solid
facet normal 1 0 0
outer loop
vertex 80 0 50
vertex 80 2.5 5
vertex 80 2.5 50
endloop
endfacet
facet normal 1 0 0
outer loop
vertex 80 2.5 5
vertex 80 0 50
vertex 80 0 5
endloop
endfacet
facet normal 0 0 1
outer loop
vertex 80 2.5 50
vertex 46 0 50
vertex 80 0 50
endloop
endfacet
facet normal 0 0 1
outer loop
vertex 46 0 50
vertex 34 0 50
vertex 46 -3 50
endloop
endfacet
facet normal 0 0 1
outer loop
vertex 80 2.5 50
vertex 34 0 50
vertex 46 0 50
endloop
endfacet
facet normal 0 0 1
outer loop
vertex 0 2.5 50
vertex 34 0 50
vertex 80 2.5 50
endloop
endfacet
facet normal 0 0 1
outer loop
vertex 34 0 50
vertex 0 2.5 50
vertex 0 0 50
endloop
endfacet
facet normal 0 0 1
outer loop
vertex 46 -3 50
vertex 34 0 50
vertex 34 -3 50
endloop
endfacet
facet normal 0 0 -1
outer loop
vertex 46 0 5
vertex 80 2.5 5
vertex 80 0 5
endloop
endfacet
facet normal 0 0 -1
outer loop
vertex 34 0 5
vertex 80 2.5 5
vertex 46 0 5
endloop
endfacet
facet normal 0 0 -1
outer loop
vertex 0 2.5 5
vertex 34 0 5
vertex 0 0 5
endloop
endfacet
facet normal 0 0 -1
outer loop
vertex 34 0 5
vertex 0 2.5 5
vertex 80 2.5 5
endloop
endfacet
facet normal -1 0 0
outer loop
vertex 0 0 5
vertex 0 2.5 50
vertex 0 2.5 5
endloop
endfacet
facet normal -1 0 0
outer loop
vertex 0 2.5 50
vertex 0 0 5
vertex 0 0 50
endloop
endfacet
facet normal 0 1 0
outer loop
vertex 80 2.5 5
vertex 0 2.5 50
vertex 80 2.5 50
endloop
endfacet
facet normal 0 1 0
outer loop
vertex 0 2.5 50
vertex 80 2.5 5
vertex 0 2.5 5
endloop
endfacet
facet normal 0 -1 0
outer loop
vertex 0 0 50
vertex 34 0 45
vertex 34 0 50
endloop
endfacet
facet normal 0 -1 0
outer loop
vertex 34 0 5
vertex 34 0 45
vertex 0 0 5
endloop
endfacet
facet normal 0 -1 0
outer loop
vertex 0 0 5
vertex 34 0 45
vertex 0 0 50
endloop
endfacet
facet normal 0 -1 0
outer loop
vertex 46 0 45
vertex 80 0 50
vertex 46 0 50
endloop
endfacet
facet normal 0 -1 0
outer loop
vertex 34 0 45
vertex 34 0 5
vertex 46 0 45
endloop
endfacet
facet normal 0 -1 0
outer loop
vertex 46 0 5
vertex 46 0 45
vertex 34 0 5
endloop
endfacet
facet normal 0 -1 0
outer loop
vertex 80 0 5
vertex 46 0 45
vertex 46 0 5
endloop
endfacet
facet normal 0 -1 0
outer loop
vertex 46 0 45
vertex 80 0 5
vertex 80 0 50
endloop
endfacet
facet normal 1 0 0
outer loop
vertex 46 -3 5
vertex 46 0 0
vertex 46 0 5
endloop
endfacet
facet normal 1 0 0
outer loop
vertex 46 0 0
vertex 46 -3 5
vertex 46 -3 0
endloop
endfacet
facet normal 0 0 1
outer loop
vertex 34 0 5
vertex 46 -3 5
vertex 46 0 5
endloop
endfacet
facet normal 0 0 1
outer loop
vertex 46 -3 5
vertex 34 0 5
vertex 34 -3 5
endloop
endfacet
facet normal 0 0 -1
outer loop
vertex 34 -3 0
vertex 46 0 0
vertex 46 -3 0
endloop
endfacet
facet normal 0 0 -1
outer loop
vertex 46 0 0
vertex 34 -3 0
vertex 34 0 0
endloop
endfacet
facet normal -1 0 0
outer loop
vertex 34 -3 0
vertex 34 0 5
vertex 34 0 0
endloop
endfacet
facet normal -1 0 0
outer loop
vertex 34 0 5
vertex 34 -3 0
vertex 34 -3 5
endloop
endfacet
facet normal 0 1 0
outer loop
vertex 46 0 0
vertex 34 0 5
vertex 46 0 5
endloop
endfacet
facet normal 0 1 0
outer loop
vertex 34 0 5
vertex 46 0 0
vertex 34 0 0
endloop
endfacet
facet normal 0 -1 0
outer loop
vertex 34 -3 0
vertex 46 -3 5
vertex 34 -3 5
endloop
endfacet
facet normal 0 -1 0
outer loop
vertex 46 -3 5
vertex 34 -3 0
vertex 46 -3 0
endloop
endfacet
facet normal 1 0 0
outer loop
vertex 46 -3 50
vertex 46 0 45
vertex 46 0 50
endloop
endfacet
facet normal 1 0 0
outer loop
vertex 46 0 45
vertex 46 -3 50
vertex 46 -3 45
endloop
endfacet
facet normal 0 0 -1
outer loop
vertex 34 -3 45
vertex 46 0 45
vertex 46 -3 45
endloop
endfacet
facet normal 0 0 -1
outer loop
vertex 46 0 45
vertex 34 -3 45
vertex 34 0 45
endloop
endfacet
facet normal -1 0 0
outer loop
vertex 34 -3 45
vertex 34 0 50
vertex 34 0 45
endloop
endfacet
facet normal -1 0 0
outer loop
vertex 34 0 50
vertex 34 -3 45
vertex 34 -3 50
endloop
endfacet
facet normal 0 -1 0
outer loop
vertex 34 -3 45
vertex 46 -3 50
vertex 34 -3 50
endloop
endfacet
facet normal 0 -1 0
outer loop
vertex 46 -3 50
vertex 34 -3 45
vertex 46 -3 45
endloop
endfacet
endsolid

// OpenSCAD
// =========================
// Projeto Caelum - Montagem modular com encaixes
// Versão revisada: paredes agora têm TABS SUPERIORES
// =========================

// -------------------- CONFIG --------------------
wall = 2.5;
clearance = 0.4;
snap_gap = 0.2;

// Dimensões do corpo
body_x = 80;
body_y = 100;
body_z = 50;

// Cabeça
head_x = 50;
head_y = 40;
head_z = 40;

// Encaixes
tab_w = 12;
tab_h = 5;
tab_d = 3;

// Pinos da cabeça
peg_d = 6;
peg_h = 8;

// modos
view_mode =2;
// -------------------- HELPERS --------------------
function slot_len_for_wall_x() = body_x - 2*wall;
function slot_len_for_wall_y() = body_y - 2*wall;

// -------------------- BASE --------------------
module base_plate() {

    base_thickness = 4;
    pocket_depth = tab_h + 0.5;

    difference() {
        cube([body_x, body_y, base_thickness]);

        // front slot
        translate([wall + (slot_len_for_wall_x() - tab_w)/2, -0.01, 0])
            cube([tab_w + clearance, tab_d + 0.5, pocket_depth + 0.1]);

        // back slot
        translate([wall + (slot_len_for_wall_x() - tab_w)/2, body_y - (tab_d + 0.5) + 0.01, 0])
            cube([tab_w + clearance, tab_d + 0.5, pocket_depth + 0.1]);

        // left slot
        translate([-0.01, wall + (slot_len_for_wall_y() - tab_w)/2, 0])
            cube([tab_d + 0.5, tab_w + clearance, pocket_depth + 0.1]);

        // right slot
        translate([body_x - (tab_d + 0.5) + 0.01, wall + (slot_len_for_wall_y() - tab_w)/2, 0])
            cube([tab_d + 0.5, tab_w + clearance, pocket_depth + 0.1]);
    }
}

// -------------------- WALL FRONT/BACK --------------------
module wall_front_back() {

    height = body_z;
    width = body_x;
    thickness = wall;

    difference() {
        union() {
            // Corpo
            translate([0,0,tab_h])
                cube([width, thickness, height - tab_h]);

            // TAB inferior
            translate([(width - tab_w)/2, -tab_d, 0])
                cube([tab_w, tab_d, tab_h]);

            // TAB superior  (NOVO)
            translate([(width - tab_w)/2, -tab_d, height - tab_h])
                cube([tab_w, tab_d, tab_h]);
        }
    }
}

// -------------------- WALL LEFT/RIGHT --------------------
module wall_left_right() {

    height = body_z;
    width = body_y;
    thickness = wall;

    difference() {
        union() {
            translate([0,0,tab_h])
                cube([width, thickness, height - tab_h]);

            // TAB inferior
            translate([(width - tab_w)/2, -tab_d, 0])
                cube([tab_w, tab_d, tab_h]);

            // TAB superior (NOVO)
            translate([(width - tab_w)/2, -tab_d, height - tab_h])
                cube([tab_w, tab_d, tab_h]);
        }
    }
}

// -------------------- TOP PLATE --------------------
module top_plate() {

    top_thickness = 4;
    r_slot_len = tab_w + clearance + snap_gap;
    r_slot_depth = tab_d + 0.5;

    head_origin_x = (body_x - head_x) / 2;
    head_origin_y = (body_y - head_y) / 2;

    difference() {
        cube([body_x, body_y, top_thickness]);

        // front slot
        translate([wall + (slot_len_for_wall_x() - tab_w)/2 - snap_gap/2, 0, -0.01])
            cube([r_slot_len, r_slot_depth, top_thickness + 0.02]);

        // back slot
        translate([wall + (slot_len_for_wall_x() - tab_w)/2 - snap_gap/2,
                   body_y - r_slot_depth + 0.01, -0.01])
            cube([r_slot_len, r_slot_depth, top_thickness + 0.02]);

        // left slot
        translate([0,
                   wall + (slot_len_for_wall_y() - tab_w)/2 - snap_gap/2, -0.01])
            cube([r_slot_depth, r_slot_len, top_thickness + 0.02]);

        // right slot
        translate([body_x - r_slot_depth + 0.01,
                   wall + (slot_len_for_wall_y() - tab_w)/2 - snap_gap/2, -0.01])
            cube([r_slot_depth, r_slot_len, top_thickness + 0.02]);

        // ----------------------
        // FUROS PARA A CABEÇA
        // ----------------------

        hole_d = peg_d + clearance;
        hole_depth = peg_h + 1;
        inset = 6;

        hx1 = head_origin_x + inset + peg_d/2;
        hy1 = head_origin_y + inset + peg_d/2;

        hx2 = head_origin_x + head_x - inset - peg_d/2;
        hy2 = head_origin_y + inset + peg_d/2;

        hx3 = head_origin_x + inset + peg_d/2;
        hy3 = head_origin_y + head_y - inset - peg_d/2;

        hx4 = head_origin_x + head_x - inset - peg_d/2;
        hy4 = head_origin_y + head_y - inset - peg_d/2;

        translate([hx1, hy1, -0.01]) cylinder(h=hole_depth, r=hole_d/2, $fn=32);
        translate([hx2, hy2, -0.01]) cylinder(h=hole_depth, r=hole_d/2, $fn=32);
        translate([hx3, hy3, -0.01]) cylinder(h=hole_depth, r=hole_d/2, $fn=32);
        translate([hx4, hy4, -0.01]) cylinder(h=hole_depth, r=hole_d/2, $fn=32);
    }
}

// -------------------- HEAD --------------------
module head_unit() {

    head_wall = 2.5;

    difference() {
        cube([head_x, head_y, head_z]);

        translate([head_wall, head_wall, head_wall])
            cube([head_x - 2*head_wall, head_y - 2*head_wall, head_z - 2*head_wall]);

        eye_r = 6;

        translate([head_x*0.25, -1, head_z*0.6])
            rotate([90,0,0]) cylinder(h=head_y+3, r=eye_r, $fn=48);

        translate([head_x*0.75, -1, head_z*0.6])
            rotate([90,0,0]) cylinder(h=head_y+3, r=eye_r, $fn=48);
    }

    inset = 6;

    translate([inset + peg_d/2, inset + peg_d/2, -peg_h])
        cylinder(h=peg_h, r=peg_d/2, $fn=32);

    translate([head_x - inset - peg_d/2, inset + peg_d/2, -peg_h])
        cylinder(h=peg_h, r=peg_d/2, $fn=32);

    translate([inset + peg_d/2, head_y - inset - peg_d/2, -peg_h])
        cylinder(h=peg_h, r=peg_d/2, $fn=32);

    translate([head_x - inset - peg_d/2, head_y - inset - peg_d/2, -peg_h])
        cylinder(h=peg_h, r=peg_d/2, $fn=32);
}

// -------------------- ASSEMBLY --------------------
module assembly() {
    base_plate();

    translate([0,-wall,4]) wall_front_back();
    translate([0,body_y-wall+wall,4]) wall_front_back();

    translate([-wall,0,4]) rotate([0,0,90]) wall_left_right();
    translate([body_x-wall+wall,0,4]) rotate([0,0,90]) wall_left_right();

    top_z = 4 + body_z;

    translate([0,0,top_z]) top_plate();

    translate([(body_x-head_x)/2, (body_y-head_y)/2, top_z]) head_unit();
}

// -------------------- EXPLODED --------------------
module exploded() {
    gap = 10;

    translate([0,0,0]) base_plate();
    translate([0, body_y + gap, 0]) wall_front_back();
    translate([body_x + gap, body_y + gap, 0]) wall_front_back();

    translate([body_x + gap, 0, 0]) rotate([0,0,90]) wall_left_right();
    translate([body_x + gap, -body_y - gap, 0]) rotate([0,0,90]) wall_left_right();

    translate([0, 2*(body_y + gap), 0]) top_plate();
    translate([0, 2*(body_y + gap) + 10, 0]) head_unit();
}

// -------------------- VIEW MODES --------------------
if (view_mode == 0) assembly();
if (view_mode == 1) base_plate();
if (view_mode == 2) wall_front_back();
if (view_mode == 3) rotate([0,0,90]) wall_left_right();
if (view_mode == 4) top_plate();
if (view_mode == 5) head_unit();
if (view_mode == 6) exploded();
